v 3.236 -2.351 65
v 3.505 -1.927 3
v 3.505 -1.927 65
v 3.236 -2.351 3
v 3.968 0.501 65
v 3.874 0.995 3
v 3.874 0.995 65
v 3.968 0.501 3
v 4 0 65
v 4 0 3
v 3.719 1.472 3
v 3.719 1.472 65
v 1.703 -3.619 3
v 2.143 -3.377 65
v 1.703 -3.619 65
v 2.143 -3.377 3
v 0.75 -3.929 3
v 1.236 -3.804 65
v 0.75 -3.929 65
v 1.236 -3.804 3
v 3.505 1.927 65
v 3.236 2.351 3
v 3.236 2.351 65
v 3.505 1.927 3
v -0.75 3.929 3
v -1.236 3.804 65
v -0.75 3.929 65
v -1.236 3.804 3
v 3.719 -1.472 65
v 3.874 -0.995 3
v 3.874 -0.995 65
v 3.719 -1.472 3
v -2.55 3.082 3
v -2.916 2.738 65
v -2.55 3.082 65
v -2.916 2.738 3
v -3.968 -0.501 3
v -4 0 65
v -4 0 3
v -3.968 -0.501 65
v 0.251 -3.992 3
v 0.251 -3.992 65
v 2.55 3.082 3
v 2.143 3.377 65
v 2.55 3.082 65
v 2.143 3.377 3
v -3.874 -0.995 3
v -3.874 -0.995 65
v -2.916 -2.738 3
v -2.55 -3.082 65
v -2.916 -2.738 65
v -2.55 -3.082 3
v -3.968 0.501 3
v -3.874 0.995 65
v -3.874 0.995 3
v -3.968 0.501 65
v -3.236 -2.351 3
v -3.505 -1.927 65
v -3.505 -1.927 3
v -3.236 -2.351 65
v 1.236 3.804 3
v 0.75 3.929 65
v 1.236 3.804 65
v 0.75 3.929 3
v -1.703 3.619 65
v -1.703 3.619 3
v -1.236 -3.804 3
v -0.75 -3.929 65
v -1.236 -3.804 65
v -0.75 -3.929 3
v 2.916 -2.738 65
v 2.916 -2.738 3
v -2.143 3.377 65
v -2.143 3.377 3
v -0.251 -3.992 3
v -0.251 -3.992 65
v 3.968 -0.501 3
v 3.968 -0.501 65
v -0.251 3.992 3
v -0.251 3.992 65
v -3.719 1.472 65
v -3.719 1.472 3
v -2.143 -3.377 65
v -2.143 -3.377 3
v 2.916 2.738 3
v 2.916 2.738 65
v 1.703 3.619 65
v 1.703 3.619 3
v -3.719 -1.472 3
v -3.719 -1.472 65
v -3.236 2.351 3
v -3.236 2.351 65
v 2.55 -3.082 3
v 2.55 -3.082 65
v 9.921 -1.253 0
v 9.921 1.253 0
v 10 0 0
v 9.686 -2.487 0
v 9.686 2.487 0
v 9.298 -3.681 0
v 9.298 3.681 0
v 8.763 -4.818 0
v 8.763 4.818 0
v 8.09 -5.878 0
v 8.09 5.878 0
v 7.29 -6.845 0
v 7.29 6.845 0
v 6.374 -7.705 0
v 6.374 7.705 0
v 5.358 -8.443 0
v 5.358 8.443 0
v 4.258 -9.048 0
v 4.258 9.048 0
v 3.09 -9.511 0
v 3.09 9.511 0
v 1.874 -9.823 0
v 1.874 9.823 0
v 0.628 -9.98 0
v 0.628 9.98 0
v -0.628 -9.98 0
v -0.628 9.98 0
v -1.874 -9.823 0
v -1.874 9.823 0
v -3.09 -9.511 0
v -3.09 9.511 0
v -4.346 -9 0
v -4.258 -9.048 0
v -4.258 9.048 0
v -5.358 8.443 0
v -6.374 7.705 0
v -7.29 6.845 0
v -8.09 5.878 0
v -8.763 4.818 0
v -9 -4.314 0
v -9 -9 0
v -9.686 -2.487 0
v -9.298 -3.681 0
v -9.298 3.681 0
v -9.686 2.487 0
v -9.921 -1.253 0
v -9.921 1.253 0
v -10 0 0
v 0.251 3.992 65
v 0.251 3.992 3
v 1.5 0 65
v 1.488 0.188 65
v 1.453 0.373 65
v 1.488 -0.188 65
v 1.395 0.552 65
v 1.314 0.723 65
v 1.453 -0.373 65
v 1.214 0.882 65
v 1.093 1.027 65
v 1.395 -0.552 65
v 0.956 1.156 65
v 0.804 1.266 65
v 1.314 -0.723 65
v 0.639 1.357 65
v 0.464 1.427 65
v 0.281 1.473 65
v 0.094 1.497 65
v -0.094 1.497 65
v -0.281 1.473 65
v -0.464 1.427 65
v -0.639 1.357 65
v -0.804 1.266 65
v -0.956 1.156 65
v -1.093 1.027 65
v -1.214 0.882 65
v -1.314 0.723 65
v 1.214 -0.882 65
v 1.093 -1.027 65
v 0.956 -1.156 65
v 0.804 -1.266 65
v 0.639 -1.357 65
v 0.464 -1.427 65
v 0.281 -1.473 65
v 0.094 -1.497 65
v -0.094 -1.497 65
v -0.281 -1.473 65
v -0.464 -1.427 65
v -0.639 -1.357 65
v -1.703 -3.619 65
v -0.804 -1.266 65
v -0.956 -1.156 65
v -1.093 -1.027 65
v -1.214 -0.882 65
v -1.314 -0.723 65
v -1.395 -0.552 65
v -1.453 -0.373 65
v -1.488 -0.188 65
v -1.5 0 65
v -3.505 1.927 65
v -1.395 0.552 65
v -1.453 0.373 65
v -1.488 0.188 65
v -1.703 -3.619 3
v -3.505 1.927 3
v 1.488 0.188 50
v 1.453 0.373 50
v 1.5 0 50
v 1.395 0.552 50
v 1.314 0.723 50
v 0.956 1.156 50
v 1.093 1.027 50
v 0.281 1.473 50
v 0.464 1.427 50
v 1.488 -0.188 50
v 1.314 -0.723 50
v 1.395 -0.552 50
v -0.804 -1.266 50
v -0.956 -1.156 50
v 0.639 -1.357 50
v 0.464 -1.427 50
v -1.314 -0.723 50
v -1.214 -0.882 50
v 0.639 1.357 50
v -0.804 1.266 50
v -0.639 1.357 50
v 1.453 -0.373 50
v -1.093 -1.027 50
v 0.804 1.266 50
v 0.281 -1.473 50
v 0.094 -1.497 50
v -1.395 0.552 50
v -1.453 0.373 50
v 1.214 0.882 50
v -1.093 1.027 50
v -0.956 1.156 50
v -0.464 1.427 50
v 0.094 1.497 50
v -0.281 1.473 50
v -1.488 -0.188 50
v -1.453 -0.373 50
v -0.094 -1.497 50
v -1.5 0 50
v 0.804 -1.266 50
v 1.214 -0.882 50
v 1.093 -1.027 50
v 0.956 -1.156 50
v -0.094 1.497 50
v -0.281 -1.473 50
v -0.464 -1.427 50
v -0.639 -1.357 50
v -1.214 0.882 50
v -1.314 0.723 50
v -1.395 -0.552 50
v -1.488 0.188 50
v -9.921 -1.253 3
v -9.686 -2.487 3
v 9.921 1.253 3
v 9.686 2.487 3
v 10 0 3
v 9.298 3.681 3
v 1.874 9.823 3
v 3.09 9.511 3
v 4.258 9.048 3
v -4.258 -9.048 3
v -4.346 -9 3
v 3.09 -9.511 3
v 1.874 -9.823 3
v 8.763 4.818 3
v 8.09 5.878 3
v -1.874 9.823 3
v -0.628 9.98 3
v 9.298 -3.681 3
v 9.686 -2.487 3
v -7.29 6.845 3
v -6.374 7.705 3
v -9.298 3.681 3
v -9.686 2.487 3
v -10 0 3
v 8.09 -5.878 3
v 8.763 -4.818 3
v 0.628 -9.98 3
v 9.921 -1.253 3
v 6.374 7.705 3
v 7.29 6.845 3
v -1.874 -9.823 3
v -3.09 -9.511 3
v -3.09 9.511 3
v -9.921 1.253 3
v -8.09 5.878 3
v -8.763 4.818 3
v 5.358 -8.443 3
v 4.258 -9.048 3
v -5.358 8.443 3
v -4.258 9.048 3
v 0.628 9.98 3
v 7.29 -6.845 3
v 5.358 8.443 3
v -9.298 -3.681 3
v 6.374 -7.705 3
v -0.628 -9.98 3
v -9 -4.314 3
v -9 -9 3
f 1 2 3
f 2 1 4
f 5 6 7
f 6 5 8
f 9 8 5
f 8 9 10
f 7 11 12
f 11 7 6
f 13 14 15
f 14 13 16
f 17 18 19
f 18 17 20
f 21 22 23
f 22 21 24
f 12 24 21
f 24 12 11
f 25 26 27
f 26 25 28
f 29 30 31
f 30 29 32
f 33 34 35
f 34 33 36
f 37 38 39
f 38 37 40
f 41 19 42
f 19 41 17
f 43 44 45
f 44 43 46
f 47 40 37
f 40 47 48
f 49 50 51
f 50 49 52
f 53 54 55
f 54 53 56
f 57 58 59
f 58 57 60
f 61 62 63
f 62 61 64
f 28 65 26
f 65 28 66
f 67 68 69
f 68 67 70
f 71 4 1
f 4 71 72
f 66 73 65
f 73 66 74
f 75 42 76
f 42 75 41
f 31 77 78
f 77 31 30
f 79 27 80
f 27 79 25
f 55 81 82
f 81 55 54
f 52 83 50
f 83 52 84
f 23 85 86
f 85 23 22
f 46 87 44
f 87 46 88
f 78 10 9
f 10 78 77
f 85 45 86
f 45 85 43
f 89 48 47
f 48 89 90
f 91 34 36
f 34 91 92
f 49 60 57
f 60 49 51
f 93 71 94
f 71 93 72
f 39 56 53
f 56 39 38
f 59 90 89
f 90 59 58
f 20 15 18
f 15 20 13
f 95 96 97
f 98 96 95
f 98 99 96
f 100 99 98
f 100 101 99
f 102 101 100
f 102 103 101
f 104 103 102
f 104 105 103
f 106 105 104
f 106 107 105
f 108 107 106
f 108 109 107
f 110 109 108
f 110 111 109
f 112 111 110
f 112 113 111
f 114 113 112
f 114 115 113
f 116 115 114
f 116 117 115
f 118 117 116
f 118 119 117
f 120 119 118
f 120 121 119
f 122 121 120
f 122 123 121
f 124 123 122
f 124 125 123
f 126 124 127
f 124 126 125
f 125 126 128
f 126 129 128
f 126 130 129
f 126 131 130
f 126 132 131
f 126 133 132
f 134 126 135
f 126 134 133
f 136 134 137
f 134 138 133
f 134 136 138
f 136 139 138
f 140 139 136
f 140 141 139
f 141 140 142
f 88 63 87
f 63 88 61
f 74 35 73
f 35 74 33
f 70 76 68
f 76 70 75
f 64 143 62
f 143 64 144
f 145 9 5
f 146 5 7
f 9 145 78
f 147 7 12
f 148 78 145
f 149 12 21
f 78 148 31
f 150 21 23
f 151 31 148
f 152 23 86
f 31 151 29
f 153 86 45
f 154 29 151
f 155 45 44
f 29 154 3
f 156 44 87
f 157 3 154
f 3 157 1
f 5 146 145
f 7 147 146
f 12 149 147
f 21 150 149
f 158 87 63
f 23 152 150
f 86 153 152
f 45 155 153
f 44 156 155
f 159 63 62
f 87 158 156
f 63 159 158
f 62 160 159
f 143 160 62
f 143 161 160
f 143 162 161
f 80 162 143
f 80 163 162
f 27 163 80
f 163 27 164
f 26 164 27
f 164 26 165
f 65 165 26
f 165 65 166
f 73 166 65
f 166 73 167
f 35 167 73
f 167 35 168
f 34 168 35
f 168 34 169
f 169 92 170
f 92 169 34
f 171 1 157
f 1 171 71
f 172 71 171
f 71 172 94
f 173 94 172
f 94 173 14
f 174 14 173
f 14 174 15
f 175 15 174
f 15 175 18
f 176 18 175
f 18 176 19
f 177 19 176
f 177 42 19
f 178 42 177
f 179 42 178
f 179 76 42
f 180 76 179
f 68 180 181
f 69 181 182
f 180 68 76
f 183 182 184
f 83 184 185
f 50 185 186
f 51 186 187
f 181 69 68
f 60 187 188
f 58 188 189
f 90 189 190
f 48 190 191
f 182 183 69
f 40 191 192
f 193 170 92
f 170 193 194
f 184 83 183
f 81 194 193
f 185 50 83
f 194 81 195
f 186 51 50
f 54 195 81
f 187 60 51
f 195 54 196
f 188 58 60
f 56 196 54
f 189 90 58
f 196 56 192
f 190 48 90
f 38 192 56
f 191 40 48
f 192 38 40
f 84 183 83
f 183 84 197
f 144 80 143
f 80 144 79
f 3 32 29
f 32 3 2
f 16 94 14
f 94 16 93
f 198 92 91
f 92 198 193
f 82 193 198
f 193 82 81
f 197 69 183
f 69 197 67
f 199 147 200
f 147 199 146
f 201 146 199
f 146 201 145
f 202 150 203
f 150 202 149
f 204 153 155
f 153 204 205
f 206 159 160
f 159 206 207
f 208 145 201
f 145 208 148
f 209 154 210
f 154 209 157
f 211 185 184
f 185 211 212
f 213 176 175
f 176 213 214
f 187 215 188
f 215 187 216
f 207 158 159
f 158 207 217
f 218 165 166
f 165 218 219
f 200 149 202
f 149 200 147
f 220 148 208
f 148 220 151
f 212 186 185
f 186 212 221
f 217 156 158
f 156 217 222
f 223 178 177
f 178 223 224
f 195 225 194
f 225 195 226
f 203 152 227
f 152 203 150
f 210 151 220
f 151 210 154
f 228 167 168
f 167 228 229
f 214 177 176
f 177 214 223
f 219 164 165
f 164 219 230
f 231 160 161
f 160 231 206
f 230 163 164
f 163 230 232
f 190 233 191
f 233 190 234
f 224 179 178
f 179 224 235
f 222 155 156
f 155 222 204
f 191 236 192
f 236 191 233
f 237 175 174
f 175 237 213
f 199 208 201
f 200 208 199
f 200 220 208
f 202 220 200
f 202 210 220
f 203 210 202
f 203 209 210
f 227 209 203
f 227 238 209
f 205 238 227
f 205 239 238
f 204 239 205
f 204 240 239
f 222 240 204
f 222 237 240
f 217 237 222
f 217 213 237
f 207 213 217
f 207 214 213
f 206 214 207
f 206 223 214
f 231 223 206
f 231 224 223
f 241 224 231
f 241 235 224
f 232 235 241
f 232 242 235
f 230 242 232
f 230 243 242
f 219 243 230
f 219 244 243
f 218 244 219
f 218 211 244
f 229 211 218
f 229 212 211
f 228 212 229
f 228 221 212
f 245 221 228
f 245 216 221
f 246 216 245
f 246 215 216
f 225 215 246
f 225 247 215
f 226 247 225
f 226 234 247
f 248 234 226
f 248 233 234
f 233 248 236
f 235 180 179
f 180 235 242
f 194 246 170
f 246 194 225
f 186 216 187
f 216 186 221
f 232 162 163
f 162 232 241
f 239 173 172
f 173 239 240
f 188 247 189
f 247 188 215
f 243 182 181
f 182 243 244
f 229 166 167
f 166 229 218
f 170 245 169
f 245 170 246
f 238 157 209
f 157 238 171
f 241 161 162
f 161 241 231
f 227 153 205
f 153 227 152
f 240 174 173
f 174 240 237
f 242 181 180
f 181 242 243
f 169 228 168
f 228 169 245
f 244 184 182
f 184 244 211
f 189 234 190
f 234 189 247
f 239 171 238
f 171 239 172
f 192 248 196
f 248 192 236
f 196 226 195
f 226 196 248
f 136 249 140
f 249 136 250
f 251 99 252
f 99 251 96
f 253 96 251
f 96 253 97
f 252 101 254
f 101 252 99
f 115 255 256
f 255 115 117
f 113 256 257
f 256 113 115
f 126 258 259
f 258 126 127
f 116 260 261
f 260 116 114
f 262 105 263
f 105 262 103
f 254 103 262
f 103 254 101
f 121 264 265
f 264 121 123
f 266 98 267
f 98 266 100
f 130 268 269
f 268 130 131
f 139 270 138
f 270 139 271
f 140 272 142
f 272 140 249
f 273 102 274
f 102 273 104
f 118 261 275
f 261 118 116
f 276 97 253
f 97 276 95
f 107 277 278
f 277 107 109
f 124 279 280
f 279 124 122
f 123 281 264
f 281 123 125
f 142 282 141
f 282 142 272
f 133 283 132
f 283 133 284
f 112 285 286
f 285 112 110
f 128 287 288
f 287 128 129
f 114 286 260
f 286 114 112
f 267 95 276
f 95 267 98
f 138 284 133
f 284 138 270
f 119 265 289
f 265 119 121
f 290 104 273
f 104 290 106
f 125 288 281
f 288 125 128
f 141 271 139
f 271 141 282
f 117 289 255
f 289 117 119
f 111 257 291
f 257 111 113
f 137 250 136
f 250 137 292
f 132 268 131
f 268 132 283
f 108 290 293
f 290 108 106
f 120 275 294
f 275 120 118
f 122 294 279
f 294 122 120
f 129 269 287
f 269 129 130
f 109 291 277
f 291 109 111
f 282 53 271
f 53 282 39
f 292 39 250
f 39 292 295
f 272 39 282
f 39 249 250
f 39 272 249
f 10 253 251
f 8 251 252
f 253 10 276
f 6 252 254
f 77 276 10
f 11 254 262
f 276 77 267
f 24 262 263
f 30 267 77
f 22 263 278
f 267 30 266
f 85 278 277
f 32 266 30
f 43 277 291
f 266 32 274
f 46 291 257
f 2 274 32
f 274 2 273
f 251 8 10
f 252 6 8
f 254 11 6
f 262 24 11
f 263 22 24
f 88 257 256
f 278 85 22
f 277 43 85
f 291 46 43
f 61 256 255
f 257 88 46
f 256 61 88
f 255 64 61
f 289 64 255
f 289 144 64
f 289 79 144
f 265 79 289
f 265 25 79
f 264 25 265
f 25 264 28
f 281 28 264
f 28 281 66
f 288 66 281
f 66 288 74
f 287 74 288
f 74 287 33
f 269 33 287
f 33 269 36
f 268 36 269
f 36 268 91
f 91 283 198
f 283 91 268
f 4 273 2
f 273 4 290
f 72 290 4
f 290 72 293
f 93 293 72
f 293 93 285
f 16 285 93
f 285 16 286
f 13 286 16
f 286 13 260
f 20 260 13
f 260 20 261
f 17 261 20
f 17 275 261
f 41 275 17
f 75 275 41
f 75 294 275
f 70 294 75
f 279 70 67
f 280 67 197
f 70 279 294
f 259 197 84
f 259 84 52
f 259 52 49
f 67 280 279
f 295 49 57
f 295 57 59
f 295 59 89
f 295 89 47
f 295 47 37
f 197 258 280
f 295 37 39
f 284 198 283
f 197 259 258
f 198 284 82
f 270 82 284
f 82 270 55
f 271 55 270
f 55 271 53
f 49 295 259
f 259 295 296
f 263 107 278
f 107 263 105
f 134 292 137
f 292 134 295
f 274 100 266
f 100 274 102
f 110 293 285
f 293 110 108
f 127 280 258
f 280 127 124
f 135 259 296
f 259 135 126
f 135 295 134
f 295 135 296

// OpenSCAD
// [FL_INDEX: keywords="openscad, 3d_parametric, Printrbot_LC_Z_Stop_Dial, csg_solid" | COT="Parametric OpenSCAD design from 3DCodeverse"]
// Title: Printrbot LC Z Stop Dial

// knob for z axis

$fn=5*10;


//Total Dial Length mm
Length=65;

//Thickness of the dial head in mm
Dial=3;

// Knob add ons
add ="pointer"; //[none,pointer,knurled]

cylinder(h=Dial,r=10);

if (add=="knurled")
{
  for ( i = [0 : 10] )
  {
      translate([sin(i*36)*9,cos(i*36)*9, 0]) cylinder(h=Dial,r=3);
  }
}

if (add=="pointer")
{
    translate([-9,-9,0]) linear_extrude(height=Dial) polygon(points=[[0,0],[7,0],[0,7]], paths=[[0,1,2]]);
}

difference () {
cylinder(h=Length,r=4);
translate([0,0,Length-15]) cylinder(h=20,r=1.5);
}
